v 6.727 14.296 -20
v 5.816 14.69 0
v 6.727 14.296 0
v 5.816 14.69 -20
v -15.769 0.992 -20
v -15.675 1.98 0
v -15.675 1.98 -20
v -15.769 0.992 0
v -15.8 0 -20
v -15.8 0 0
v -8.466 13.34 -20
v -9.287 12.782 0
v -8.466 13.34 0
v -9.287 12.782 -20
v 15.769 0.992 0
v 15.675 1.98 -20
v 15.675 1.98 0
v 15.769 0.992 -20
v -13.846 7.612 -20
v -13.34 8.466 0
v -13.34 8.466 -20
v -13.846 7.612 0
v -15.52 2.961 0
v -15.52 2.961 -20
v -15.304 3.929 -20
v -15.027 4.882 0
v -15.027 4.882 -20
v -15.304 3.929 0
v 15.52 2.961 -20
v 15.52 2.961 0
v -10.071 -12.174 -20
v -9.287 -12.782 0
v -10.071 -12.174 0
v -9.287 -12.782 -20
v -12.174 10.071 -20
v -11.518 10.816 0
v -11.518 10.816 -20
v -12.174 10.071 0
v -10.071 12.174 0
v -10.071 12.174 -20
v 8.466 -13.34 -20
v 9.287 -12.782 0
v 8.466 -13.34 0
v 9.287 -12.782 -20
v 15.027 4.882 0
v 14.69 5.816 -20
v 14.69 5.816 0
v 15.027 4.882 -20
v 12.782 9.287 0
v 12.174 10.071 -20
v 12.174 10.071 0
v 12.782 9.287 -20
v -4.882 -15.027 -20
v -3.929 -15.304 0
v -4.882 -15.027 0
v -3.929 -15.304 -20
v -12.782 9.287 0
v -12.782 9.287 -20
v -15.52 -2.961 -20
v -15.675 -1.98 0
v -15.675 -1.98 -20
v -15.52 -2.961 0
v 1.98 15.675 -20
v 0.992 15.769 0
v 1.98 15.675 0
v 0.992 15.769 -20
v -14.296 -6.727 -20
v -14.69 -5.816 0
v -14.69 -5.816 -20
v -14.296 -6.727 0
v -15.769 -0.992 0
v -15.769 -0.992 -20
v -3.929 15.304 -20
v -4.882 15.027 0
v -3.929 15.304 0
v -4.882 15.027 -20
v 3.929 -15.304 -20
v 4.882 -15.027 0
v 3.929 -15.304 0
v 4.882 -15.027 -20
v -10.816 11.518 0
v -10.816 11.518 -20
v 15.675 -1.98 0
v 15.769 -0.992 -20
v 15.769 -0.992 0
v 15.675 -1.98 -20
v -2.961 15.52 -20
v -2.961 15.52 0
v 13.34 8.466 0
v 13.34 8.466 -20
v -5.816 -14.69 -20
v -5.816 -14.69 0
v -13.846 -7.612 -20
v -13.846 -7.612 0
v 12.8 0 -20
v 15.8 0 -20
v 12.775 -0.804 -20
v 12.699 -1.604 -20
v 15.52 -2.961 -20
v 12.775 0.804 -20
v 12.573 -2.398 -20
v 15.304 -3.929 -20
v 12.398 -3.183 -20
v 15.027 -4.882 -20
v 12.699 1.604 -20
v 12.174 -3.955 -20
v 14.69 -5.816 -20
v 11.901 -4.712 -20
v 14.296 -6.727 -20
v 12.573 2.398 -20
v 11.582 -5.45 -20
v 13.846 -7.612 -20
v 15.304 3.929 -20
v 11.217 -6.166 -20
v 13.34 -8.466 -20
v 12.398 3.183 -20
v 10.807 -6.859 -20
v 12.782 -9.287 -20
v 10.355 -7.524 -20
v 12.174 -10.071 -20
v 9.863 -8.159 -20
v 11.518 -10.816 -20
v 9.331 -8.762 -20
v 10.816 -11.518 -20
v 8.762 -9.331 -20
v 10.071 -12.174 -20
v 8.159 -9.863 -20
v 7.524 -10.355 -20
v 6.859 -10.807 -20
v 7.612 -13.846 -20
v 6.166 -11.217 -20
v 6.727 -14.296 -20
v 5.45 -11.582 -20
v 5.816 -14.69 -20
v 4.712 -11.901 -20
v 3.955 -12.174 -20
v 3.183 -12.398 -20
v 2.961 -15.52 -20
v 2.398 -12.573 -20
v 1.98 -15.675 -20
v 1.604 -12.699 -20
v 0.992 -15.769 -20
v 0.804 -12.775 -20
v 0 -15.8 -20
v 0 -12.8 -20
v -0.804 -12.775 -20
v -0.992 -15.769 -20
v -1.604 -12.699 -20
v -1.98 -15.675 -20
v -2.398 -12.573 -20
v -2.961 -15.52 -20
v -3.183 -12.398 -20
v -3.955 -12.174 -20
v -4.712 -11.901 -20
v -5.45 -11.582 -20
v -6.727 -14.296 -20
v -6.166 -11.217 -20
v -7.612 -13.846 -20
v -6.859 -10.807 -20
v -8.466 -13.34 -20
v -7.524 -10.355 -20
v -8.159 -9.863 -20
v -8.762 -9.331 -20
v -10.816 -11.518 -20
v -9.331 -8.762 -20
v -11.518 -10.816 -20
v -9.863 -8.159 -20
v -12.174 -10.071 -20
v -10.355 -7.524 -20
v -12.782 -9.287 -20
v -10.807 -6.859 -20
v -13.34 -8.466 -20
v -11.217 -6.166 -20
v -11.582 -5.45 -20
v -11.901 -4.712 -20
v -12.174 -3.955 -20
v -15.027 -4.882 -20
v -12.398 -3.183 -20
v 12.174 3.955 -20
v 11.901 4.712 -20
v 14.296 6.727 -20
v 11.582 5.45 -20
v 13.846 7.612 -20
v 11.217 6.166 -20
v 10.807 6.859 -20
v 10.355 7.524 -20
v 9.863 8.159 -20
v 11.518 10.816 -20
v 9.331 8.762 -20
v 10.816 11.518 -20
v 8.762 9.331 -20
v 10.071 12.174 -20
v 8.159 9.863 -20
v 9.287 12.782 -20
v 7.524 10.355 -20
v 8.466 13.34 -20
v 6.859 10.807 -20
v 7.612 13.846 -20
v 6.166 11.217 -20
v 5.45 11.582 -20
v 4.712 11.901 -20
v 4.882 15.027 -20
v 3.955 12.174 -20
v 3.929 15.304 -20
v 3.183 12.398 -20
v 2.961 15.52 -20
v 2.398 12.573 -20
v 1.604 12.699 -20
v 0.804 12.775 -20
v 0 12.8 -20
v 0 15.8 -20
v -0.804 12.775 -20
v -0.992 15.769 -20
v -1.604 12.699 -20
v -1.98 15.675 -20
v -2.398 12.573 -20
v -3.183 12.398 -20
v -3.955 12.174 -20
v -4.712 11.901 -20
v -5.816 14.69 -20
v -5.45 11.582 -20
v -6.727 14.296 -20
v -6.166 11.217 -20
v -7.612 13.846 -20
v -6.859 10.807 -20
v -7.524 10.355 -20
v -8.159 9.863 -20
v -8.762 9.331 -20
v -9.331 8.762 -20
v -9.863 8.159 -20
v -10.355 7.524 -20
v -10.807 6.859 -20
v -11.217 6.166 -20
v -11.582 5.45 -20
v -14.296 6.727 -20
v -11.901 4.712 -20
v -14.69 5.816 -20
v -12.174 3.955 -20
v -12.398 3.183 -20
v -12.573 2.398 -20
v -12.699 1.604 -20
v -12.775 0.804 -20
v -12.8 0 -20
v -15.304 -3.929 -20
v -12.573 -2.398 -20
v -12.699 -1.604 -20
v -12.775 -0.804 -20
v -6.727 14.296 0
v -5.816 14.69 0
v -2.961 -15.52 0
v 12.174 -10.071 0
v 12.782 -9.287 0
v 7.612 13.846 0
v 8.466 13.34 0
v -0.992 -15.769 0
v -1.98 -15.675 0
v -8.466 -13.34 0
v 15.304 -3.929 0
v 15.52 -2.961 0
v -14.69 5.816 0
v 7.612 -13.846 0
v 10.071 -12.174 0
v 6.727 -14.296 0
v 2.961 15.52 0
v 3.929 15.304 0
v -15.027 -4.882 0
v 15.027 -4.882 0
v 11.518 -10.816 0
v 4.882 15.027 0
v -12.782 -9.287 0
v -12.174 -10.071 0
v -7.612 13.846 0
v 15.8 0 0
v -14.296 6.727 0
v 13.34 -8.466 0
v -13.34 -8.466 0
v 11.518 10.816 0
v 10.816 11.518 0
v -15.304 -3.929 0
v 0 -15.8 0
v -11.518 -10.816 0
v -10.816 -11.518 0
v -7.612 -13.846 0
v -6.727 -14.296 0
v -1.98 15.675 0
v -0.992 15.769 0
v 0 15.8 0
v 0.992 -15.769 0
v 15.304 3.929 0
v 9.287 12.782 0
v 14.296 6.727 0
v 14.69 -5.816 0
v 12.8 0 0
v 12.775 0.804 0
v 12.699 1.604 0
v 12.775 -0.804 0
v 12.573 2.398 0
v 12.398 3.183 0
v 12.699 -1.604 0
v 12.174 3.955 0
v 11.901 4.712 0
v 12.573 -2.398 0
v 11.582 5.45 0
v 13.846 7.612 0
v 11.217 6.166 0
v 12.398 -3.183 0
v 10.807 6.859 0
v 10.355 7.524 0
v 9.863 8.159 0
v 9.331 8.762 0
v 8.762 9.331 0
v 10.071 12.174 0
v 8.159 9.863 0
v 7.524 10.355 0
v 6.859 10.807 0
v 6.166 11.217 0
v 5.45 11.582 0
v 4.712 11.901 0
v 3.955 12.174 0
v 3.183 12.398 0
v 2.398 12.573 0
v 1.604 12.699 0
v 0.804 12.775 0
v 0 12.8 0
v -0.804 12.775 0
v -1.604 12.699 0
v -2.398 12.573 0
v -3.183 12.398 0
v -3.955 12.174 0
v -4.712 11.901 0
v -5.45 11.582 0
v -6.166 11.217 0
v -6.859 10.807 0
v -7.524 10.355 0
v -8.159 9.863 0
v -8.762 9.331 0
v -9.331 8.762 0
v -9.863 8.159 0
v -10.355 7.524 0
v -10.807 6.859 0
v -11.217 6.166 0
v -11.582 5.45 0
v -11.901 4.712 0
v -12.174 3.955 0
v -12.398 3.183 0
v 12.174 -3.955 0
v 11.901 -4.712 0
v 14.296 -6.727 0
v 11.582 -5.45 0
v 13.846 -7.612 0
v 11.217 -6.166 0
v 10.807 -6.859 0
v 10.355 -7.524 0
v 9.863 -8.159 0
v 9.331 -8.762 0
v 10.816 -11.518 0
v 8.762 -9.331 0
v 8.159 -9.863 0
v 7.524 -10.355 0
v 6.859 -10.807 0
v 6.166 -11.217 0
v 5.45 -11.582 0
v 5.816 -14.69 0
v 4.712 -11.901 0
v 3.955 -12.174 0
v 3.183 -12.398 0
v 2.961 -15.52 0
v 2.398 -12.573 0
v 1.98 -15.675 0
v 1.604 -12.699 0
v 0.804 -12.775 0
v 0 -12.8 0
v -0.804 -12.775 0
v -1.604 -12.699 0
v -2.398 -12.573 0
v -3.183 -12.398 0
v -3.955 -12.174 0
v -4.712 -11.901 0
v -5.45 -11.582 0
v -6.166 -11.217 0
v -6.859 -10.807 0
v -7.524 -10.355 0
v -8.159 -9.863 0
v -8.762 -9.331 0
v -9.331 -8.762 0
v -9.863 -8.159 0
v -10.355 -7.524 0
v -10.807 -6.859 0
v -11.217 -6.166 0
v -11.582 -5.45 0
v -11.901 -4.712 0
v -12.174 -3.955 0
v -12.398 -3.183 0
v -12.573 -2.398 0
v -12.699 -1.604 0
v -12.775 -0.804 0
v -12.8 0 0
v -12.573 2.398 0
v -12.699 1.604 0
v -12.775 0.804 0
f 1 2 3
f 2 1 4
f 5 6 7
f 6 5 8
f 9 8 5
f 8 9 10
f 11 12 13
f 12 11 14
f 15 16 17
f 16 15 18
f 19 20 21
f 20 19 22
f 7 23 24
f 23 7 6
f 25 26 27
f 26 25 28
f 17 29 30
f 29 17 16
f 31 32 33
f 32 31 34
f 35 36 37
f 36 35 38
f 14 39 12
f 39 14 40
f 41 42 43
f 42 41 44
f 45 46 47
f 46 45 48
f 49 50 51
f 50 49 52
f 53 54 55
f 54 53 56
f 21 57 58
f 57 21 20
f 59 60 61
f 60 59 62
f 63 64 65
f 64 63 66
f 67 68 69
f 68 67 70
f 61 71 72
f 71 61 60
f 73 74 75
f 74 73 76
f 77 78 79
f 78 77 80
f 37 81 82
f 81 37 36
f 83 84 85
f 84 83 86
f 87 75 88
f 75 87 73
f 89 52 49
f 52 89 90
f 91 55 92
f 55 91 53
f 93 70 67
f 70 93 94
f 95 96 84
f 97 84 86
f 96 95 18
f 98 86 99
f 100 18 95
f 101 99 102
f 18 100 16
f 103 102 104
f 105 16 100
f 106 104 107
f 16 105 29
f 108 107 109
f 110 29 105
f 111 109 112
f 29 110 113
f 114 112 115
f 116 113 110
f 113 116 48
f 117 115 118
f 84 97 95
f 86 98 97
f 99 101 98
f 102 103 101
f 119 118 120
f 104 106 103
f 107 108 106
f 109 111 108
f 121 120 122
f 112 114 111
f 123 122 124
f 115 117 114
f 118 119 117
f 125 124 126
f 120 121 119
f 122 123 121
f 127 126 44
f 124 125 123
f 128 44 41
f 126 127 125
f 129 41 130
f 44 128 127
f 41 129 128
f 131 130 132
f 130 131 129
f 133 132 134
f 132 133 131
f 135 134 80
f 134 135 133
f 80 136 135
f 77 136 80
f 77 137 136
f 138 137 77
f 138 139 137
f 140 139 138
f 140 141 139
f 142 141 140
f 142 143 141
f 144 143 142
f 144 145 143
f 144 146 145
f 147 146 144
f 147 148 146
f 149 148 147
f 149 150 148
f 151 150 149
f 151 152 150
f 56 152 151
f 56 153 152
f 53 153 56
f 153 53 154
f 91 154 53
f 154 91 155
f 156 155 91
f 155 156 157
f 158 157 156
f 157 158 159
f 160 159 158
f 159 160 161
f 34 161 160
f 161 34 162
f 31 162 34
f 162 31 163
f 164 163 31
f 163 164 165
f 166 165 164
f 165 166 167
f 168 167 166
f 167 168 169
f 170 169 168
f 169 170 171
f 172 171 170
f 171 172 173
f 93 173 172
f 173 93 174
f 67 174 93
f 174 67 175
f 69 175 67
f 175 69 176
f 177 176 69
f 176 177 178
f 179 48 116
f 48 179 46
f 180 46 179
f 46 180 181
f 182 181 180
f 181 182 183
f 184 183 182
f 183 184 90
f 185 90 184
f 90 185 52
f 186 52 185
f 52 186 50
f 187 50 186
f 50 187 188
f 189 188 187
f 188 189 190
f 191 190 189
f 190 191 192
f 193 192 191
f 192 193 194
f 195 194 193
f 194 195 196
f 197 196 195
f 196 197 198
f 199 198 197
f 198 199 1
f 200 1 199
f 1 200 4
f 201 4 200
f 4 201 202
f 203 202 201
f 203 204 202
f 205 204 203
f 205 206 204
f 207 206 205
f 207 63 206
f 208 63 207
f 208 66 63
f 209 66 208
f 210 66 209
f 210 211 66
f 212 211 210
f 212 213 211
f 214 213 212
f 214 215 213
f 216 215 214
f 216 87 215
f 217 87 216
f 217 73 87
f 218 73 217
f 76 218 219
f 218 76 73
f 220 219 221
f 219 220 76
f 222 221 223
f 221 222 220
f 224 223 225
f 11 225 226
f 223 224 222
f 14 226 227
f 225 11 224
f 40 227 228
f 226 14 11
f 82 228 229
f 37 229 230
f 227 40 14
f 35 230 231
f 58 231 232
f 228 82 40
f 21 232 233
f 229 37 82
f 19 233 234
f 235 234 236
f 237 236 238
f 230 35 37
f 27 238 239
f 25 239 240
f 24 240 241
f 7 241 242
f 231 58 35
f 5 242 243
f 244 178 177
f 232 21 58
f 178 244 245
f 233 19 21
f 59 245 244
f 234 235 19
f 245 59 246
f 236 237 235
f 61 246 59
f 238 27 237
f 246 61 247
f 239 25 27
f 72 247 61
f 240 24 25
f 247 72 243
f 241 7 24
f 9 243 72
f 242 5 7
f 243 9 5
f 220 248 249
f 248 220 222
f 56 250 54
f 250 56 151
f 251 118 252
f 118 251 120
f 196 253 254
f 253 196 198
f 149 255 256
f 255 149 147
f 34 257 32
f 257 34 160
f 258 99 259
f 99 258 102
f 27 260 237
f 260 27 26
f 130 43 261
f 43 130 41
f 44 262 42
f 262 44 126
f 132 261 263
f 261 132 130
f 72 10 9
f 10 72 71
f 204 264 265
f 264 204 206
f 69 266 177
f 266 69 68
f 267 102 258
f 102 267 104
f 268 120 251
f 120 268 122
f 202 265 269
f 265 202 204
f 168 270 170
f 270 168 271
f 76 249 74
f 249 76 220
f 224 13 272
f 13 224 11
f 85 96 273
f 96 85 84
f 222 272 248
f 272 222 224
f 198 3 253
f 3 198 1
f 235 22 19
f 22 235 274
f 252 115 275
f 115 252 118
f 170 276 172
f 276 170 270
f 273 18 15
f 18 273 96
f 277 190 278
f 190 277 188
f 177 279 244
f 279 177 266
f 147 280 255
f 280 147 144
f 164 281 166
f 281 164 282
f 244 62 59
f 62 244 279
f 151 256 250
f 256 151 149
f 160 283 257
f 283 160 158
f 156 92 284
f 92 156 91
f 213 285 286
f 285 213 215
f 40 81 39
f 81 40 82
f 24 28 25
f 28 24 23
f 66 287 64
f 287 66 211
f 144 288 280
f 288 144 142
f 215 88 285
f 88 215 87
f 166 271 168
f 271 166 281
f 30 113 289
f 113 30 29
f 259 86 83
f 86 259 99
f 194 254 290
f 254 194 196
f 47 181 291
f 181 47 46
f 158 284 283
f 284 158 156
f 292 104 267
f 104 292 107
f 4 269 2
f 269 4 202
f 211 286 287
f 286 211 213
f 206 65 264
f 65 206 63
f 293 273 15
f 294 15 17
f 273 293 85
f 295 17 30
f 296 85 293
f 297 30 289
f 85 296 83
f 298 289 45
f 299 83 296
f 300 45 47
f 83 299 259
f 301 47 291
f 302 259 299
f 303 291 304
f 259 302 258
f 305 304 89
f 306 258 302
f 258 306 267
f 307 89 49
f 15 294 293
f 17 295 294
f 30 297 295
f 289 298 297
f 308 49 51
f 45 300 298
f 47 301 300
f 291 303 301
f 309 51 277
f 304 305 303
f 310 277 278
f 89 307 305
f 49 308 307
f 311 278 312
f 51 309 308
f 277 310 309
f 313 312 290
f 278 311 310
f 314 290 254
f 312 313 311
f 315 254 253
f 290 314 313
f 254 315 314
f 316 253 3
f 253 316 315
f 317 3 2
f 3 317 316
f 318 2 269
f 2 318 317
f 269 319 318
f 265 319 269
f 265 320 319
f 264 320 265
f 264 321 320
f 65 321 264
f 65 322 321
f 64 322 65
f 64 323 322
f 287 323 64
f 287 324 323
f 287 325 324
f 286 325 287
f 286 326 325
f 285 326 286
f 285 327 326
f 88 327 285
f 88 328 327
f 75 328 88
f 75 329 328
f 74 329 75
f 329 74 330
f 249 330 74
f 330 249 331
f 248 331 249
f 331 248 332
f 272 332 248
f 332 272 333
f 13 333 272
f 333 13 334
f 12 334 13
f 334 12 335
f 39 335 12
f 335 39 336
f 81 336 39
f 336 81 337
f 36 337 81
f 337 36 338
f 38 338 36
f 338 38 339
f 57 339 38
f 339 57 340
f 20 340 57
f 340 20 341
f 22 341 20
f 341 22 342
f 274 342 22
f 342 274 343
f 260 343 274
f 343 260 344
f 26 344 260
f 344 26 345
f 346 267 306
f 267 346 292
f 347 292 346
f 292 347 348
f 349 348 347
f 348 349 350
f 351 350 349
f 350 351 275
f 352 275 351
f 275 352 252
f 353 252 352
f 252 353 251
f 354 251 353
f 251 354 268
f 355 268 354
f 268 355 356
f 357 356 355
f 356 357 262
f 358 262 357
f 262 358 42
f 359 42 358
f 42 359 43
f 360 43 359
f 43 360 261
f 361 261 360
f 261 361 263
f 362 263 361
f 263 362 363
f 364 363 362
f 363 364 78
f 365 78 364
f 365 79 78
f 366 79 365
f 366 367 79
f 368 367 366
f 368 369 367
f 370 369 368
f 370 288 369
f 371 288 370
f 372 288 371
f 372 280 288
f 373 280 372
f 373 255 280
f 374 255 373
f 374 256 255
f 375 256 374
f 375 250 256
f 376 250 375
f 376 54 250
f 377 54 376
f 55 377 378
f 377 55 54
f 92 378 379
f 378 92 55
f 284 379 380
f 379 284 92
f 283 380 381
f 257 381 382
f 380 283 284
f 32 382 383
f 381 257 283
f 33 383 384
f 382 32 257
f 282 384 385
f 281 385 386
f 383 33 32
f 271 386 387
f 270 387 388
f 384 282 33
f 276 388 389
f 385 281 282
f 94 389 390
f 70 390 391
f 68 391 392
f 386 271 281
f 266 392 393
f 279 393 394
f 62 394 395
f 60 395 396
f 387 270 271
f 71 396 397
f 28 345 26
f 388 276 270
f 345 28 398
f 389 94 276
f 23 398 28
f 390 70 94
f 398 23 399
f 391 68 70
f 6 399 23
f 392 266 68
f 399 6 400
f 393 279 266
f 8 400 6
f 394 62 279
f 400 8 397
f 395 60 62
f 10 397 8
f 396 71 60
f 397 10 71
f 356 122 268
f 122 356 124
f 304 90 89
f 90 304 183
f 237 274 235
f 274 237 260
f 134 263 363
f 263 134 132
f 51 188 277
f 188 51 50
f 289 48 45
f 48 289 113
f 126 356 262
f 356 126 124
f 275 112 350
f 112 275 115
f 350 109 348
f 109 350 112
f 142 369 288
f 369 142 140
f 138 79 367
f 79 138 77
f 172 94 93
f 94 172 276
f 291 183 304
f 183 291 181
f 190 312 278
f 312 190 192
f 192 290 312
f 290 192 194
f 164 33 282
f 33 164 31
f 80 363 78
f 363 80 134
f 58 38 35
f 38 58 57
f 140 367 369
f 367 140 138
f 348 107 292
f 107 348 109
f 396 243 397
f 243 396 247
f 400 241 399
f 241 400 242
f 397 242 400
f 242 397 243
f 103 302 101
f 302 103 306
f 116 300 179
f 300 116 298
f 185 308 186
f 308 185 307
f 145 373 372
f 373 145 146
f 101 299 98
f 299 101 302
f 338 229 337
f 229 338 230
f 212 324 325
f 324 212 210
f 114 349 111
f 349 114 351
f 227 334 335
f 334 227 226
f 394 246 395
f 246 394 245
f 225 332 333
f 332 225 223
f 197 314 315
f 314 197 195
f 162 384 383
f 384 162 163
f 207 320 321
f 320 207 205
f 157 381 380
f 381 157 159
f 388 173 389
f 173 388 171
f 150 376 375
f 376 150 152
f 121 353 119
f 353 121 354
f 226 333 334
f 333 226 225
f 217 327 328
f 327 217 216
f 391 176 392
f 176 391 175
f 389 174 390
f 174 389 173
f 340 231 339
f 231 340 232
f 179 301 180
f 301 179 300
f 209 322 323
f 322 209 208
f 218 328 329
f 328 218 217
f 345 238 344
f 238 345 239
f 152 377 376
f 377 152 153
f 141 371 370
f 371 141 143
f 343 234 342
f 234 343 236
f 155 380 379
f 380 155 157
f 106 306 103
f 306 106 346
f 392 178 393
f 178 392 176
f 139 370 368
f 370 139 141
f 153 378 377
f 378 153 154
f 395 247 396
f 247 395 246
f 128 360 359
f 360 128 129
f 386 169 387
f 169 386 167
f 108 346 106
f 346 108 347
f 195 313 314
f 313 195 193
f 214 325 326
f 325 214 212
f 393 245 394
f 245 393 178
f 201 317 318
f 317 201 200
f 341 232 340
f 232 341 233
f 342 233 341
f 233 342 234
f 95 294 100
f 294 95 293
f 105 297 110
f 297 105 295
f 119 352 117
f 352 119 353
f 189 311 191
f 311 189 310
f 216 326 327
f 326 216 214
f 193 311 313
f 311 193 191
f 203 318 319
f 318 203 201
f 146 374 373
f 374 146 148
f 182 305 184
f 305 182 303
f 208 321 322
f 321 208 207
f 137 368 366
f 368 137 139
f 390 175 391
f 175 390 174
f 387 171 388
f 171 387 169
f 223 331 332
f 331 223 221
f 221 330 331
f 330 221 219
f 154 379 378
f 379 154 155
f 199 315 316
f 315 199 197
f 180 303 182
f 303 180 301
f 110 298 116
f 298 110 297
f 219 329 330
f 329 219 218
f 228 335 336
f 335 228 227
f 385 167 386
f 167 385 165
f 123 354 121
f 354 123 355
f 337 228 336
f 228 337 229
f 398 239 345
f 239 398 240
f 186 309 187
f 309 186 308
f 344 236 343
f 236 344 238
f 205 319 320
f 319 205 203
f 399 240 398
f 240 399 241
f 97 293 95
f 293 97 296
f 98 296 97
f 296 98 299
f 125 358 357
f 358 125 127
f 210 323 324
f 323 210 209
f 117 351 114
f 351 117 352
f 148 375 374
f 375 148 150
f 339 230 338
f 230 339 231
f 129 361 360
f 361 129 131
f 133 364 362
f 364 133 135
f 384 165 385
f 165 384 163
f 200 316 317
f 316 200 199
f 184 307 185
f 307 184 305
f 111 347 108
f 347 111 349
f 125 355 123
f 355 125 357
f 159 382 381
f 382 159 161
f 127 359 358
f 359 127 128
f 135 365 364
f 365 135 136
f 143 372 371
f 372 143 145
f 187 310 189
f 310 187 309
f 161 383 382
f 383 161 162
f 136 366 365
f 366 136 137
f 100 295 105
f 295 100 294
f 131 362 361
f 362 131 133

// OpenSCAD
// file: ../lib/sensor.scad
//rotationSensor();
//rotationSensorSpacing();

module rotationSensor(){
	//Digi-Key Part Number: 490-2400-ND
	//Manufacturer Part Number: SV01A103AEA01B00
	
	roatationSensorBody();
	
	translate([-6.5, -2.5, -0.6])
		cube([1.5, 0.8, 0.2], center = true);
		
	translate([-6.5, 0, -0.6])
		cube([1.5, 0.8, 0.2], center = true);		
		
	translate([-6.5, 2.5, -0.6])
		cube([1.5, 0.8, 0.2], center = true);		
		
	translate([6.5, 0, -0.6])
		cube([1.5, 0.8, 0.2], center = true);				
}

module roatationSensorBody(inflate = false) {
	x1 = inflate ? 1 : 0;
	x2 = inflate ? 0.25 : 0;
	x3 = inflate ? 0.5 : 0;

	difference()
	{
		cube ([12 + x1, 11 + x1, 2 + x3], center = true);
		
		//translate([0.5, 0, 0]) 
		difference() 
		{
			cylinder(h = 5, d1 = 4, d2 = 4, center = true, $fn = 15);
			translate([3, 0, 0]) cube([4, 4, 4], center = true);
		}
		
		translate([8 + x2, 7.5 + x2, 0])
		rotate([0, 0, 45]) 
			cube([10, 10, 5], center = true);
		
		translate([8 + x2, -7.5 - x2, 0])
		rotate([0, 0, -45]) 
			cube([10, 10, 5], center = true);
		
		//translate([-8.7 - x2, 8.7 + x2, 0])
		//rotate([0, 0, 45]) 
		//	cube([10, 10, 5], center = true);
		
		//translate([-8.7 - x2, -8.7 - x2, 0])
		//rotate([0, 0, -45]) 
		//	cube([10, 10, 5], center = true);				
	}
}

module rotationSensorSpacing() {
	translate([0, 0, 1])
		roatationSensorBody(inflate = true);
	
	cylinder(h = 10, d = 6, $fn = 15);
	
	translate([-7.5, 0, 0])
		cube ([2, 8.5, 15], center = true);

	translate([-5.5, 5, 2.5])
		cube ([2, 2, 1], center = true);
		
	translate([-5.5, -5, 2.5])
		cube ([2, 2, 1], center = true);
}
// file: ../lib/pulley.scad
additionalToothWidth = 0.2; //mm
additionalToothHeight = 0; //mm

//pulley (teeth = 100, height = 10);

module pulley(teeth, height, type="GT2", center = false, upperBorder = true, lowerBorder = true) {
	toothDepth = type=="MXL" ? 0.508 : 0.764;
	toothWidth =  type=="MXL" ? 1.321 : 1.494;
	toothPitch = type=="MXL" ? 2.032 : 2.00;
	pitchLineOffset = type=="MXL" ? 0.254 : 0.254;
	
	pulleyD = 2*((teeth*toothPitch)/(3.14159265*2)-pitchLineOffset);
	toothDistanceFromCentre = sqrt( pow(pulleyD/2,2) - pow((toothWidth+additionalToothWidth)/2,2));
	toothWidthScale = (toothWidth + additionalToothWidth ) / toothWidth;
	toothDepthScale = ((toothDepth + additionalToothHeight ) / toothDepth) ;
	
	difference()
	{
		union()
		{
			cylinder(d=pulleyD,h=height, $fn=teeth*4, center = center);
			
			if (upperBorder)
				translate([0, 0, height/2])
					cylinder(d=pulleyD + 1,h=1.5, $fn=teeth*4);
				
			if (lowerBorder)
				translate([0, 0, -height/2 - 1.5])
					cylinder(d=pulleyD + 1,h=1.5, $fn=teeth*4);				
		}
			
		for(i=[1:teeth])
		{			
			rotate([0,0,i*(360/teeth)])
			translate([0,-toothDistanceFromCentre,-height/2]) 
			scale ([ toothWidthScale , toothDepthScale , 1 ]) 
				if (type=="MXL")
				{
					toothMXL(height);
				}
				else
				{
					toothGT2(height);
				}
		}
	}
}
			
module toothMXL(height) {
	linear_extrude(height=height) 
		polygon([[-0.660421,-0.5],[-0.660421,0],[-0.621898,0.006033],[-0.587714,0.023037],[-0.560056,0.049424],[-0.541182,0.083609],[-0.417357,0.424392],[-0.398413,0.458752],[-0.370649,0.48514],[-0.336324,0.502074],[-0.297744,0.508035],[0.297744,0.508035],[0.336268,0.502074],[0.370452,0.48514],[0.39811,0.458752],[0.416983,0.424392],[0.540808,0.083609],[0.559752,0.049424],[0.587516,0.023037],[0.621841,0.006033],[0.660421,0],[0.660421,-0.5]]);
}

module toothGT2(height) {
	linear_extrude(height=height) 
		polygon([[0.747183,-0.5],[0.747183,0],[0.647876,0.037218],[0.598311,0.130528],[0.578556,0.238423],[0.547158,0.343077],[0.504649,0.443762],[0.451556,0.53975],[0.358229,0.636924],[0.2484,0.707276],[0.127259,0.750044],[0,0.76447],[-0.127259,0.750044],[-0.2484,0.707276],[-0.358229,0.636924],[-0.451556,0.53975],[-0.504797,0.443762],[-0.547291,0.343077],[-0.578605,0.238423],[-0.598311,0.130528],[-0.648009,0.037218],[-0.747183,0],[-0.747183,-0.5]]);
}
// file: ../lib/ballBearing.scad
//ballBearingHolder(28, 8, 4);

module ballBearing6707(){
	//35x44x5
	ballBearing(inner = 35, outer = 44, height = 5);
}

module ballBearing6706(){
	//30x37x4
	ballBearing(inner = 30, outer = 37, height = 4);
}

module ballBearing6705() {
	// 25x32x4
	ballBearing(inner = 25, outer = 32, height = 4);
}


module ballBearing8607() {
	// 35x47x7
	ballBearing(inner = 35, outer = 47, height = 7);
}

module ballBearing6806(){
	// 30x42x7
	ballBearing(inner = 30, outer = 42, height = 7);
}

module ballBearing6805() {
	// 25x37x7
	ballBearing(inner = 25, outer = 37, height = 7);
}

module ballBearing6804() {
	//20x32x7
	ballBearing(inner = 20, outer = 32, height = 7);
}

module ballBearing(inner, outer, height) {
	difference()
	{
		cylinder(d = outer, h = height, center = true, $fn = 50);
		cylinder(d = inner, h = height + 2, center = true, $fn = 50);
	}
}

module ballBearingHolder(outer, h, thickness) {
    difference(){
        cylinder(h = h + 2, d1 = outer + thickness * 2, d2 = outer + thickness * 2);
        
        translate([0, 0, 2]) 
            cylinder(h = h+1, d1 = outer, d2 = outer);
        
        translate([0, 0, -1])
            cylinder(h = h + 4, d1 = outer - 4, d2 = outer - 4); 
    }
}
// file: ../brushless/_sizes.scad
h1 = 250;
h2 = 170;

belt = 7; // 6 mm wide belt
pulleyH = belt + 3;

th = 3;
thEdge = 1.5; // ball bearing holder

// ball bearing

bbi = 25 - 0.2;
bbo = 37 + 0.7;
bbh = 7;

bbiPlastic = 25 + 0.4;
bboPlastic = 37 - 0.6;

//

bb6000i = 10 - 0.2;
bb6000o = 26 + 0.7;
bb6000h = 8;

//

bb6800i = 10 - 0.2;
bb6800o = 19 + 0.7;
bb6800h = 5;

//

bb6805i = 25 - 0.2;
bb6805o = 37 + 0.7;
bb6805h = 7;

//

rod25o = 25;
rod25i = rod25o - 1 * 2;

rod = 10 + 0.2;

motorAdjustment = 5; // one side

// motors ---------------------------------------------------------------------

// 50XX

motor5D = 58;
motor5H = 27;

motor5SpaceD = motor5D + 5;
motor5SpaceH = motor5H;

//40XX

motor4D = 50;
motor4H = 30;

motor4SpaceD = motor4D + 5;
motor4SpaceH = motor4H;

// heap -----------------------------------------------------------------------

heapWidth = 70;

// part 1 ---------------------------------------------------------------------

part1MotorX = 20;
part1UpperAttachment = 25;
part1LowerAttachment = 25;
part1HeapMotorOffset = [part1MotorX, 0, -50];
part1KneeMotorOffset = [part1MotorX, 0, -h1 + 50];
part1KneeOffset = [0, 0, -h1];

// part 2 ---------------------------------------------------------------------

part2MotorOffset = [10, 0, -h2 + 50];
part2LowerAttachment = 8;
part2AnkleOffset = [0, 0, -h2];
// file: ../brushless/_shared.scad
include <_sizes.scad>
use <../lib/shapes.scad>
use <../lib/ballBearing.scad>
use <../lib/pulley.scad>
use <../lib/sensor.scad>

difference()
{
	bearingOuter();
	translate([-50, 0, 0])
	cube ([100, 100, 100]);
}

module bearingOuter(withPulley = true) {
	translate([-thEdge/2, 0, 0])
	rotate([0, -90, 0])
		if (withPulley)
		{
			difference()
			{
				pulley(teeth=70, height = belt, center = true);
				cylinder(d = bbo, h = belt + 5, $fn = 70, center = true);
			}
		}
		else
		{
			ring(d = bbo, t = th, h = bbh + thEdge, $fn = 70);
		}

	// this stops the bearing
	
	translate([(-bbh - thEdge - 1) / 2, 0, 0])
	rotate([0, -90, 0])
		ring(d = bbo - thEdge * 2, t = thEdge * 2, h = thEdge + 1, $fn = 70);
		
	// sensor holder
	
	translate([(-bbh - th) / 2 - 1, 0, 0])
	rotate([0, -90, 0])
	difference()
	{
		cylinder(h = th, d = bbo);
		
		rotationSensorSpacing();
		
		translate([0, 11, 0])
			cylinder (d =6, h = 10, center = true);

		translate([0, -11, 0])
			cylinder (d =6, h = 10, center = true);
	}
}

module bearingInner(showBearing = true, color) {
	outside = 10;

	if (showBearing)
	{
		color("white")
		rotate([0, -90, 0])
			ballBearing(inner = bbi, outer = bbo, height = bbh);
	}
		
	// inner

	color(color)
	{
		translate([(outside - thEdge) / 2, 0, 0])
		rotate([0, 90, 0])
			ring(d = bbi - th * 2, t = th, h = bbh + outside + thEdge, $fn = 70);
			
		translate([(-bbh - thEdge) / 2, 0, 0])
		rotate([0, 90, 0])
		{
			ring(d = bbi, t = thEdge, h = thEdge, $fn = 70);
			
			translate([0, 0, (th - thEdge) / 2])
				cube([6, bbi - 2, th], center = true);
				
			translate([0, 0, -2])
			dCylinder(h = 5, d = 4, x = 1, $fn = 20);	
		}
	}
}

module motor4(){
	z = 3;
	
	cylinder(d1 = 30, d2 = motor4D, h = z);
	translate([0, 0, z]) cylinder(d1 = motor4D, d2 = motor4D, h = motor4H - z * 2);
	translate([0, 0, motor4H - z]) cylinder(d1 = motor4D, d2 = 30, h = z);
	
	cylinder(d = 25, h = motor4H + pulleyH);	
}

module motor5() {
	z = 3;
	
	cylinder(d1 = 30, d2 = motor5D, h = z);
	translate([0, 0, z]) cylinder(d1 = motor5D, d2 = motor5D, h = motor5H - z * 2);
	translate([0, 0, motor5H - z]) cylinder(d1 = motor5D, d2 = 30, h = z);
	
	cylinder(d = 25, h = motor5H + pulleyH);	
}	

module motor5BoltSpace(){
	d = 25 / sqrt(2) / 2;
	
	for (x = [-d, d])
	for (y = [-d, d])
		translate([x, y, 0])
		hull()
		{
			translate([0, motorAdjustment, 0])
				cylinder(d = 4, h = 10);
				
			translate([0, -motorAdjustment, 0])
				cylinder(d = 4, h = 10);
		}
		
	hull()
	{
		translate([0, motorAdjustment, 0])
			cylinder(d = 10, h = 10);
			
		translate([0, -motorAdjustment, 0])
			cylinder(d = 10, h = 10);			
	}
}

module motor4BlockA(inner = false) {
	wall = inner ? 0 : th ;
	
	hull() 
	{
		translate([motorAdjustment, 0, wall/2])
			halfShayba(d = motor4SpaceD + wall * 2, h = motor4SpaceH + wall, rd = 15);

		translate([-motorAdjustment, 0, wall/2])
			halfShayba(d = motor4SpaceD + wall * 2, h = motor4SpaceH + wall, rd = 15);
	}
}

module motor5BlockA(inner = false) {
	wall = inner ? 0 : th;
	
	hull() 
	{
		translate([motorAdjustment, 0, wall/2])
			halfShayba(d = motor5SpaceD + wall * 2, h = motor5SpaceH + wall, rd = 15);

		translate([-motorAdjustment, 0, wall/2])
			halfShayba(d = motor5SpaceD + wall * 2, h = motor5SpaceH + wall, rd = 15);
	}
}

module motor5BlockB(inner = false) {
	wall = inner ? 0 : th;
	h = 13;
	
	translate([0, 0, -motor5SpaceH / 2 - h/2])
	rotate([180, 0, 0])
	hull() 
	{
		translate([motorAdjustment, 0, wall/2])
			halfShayba(d = motor5SpaceD + wall * 2, h = h + wall, rd = 15);

		translate([-motorAdjustment, 0, wall/2])
			halfShayba(d = motor5SpaceD + wall * 2, h = h + wall, rd = 15);
	}
}

module bb6000(){
	bbi = 10;
	bbo = 26;
	bbh = 8;

	ring(d = bbi, h = bbh, t = (bbo-bbi)/2);
}

module bb6800(){
	bbi = 10;
	bbo = 19;
	bbh = 5;

	ring(d = bbi, h = bbh, t = (bbo-bbi)/2);
}

module bb6805(){
	bbi = 25;
	bbo = 37;
	bbh = 7;

	ring(d = bbi, h = bbh, t = (bbo-bbi)/2);
}
// file: ../lib/shapes.scad
module cylinderSector(d, h, start_angle, end_angle) {
    R = d * sqrt(2) / 2;// + 1;
    a0 = (4 * start_angle + 0 * end_angle) / 4;
    a1 = (3 * start_angle + 1 * end_angle) / 4;
    a2 = (2 * start_angle + 2 * end_angle) / 4;
    a3 = (1 * start_angle + 3 * end_angle) / 4;
    a4 = (0 * start_angle + 4 * end_angle) / 4;
    if(end_angle > start_angle)
		linear_extrude(height = h)
        intersection() {
			circle(d = d);
			polygon([
				[0,0],
				[R * cos(a0), R * sin(a0)],
				[R * cos(a1), R * sin(a1)],
				[R * cos(a2), R * sin(a2)],
				[R * cos(a3), R * sin(a3)],
				[R * cos(a4), R * sin(a4)],
				[0,0]
		   ]);
		}
}

module ringSector(d, h, t, start_angle, end_angle)
{
	difference()
	{
		cylinderSector(d = d + t*2, h = h, start_angle=start_angle, end_angle=end_angle) ;
		
		translate([0, 0, -0.5])
			cylinder(d = d, h = h + 1);
	}
}

//Draw a prism based on a 
//right angled triangle
//l - length of prism
//w - width of triangle
//h - height of triangle

module prism(l, w, h) {
       polyhedron(points=[
               [0,0,h],           // 0    front top corner
               [0,0,0],[w,0,0],   // 1, 2 front left & right bottom corners
               [0,l,h],           // 3    back top corner
               [0,l,0],[w,l,0]    // 4, 5 back left & right bottom corners
       ], faces=[ // points for all faces must be ordered clockwise when looking in
               [0,2,1],    // top face
               [3,4,5],    // base face
               [0,1,4,3],  // h face
               [1,2,5,4],  // w face
               [0,3,5,2],  // hypotenuse face
       ]);
}

//The top point will be centred
module pyramid(w, l, h) {
	mw = w/2;
	ml = l/2;
	polyhedron(points = [
		[0,  0,  0],
		[w,  0,  0],
		[0,  l,  0],
		[w,  l,  0],
		[mw, ml, h]
	], faces = [
		[4, 1, 0],
		[4, 3, 1],
		[4, 2, 3],
		[4, 0, 2],
		//base
		[0, 1, 2],
		[2, 1, 3]
	]);
}

//pyramid(4,4,4);

//A cuboid with a tapered top
//w - width
//l - length
//h - height
//taper - how much to taper the each edge at the top by

module tapered_cuboid(w, l, h, taper) {
	ho = taper;
	hw = w - taper;
	hl = l - taper;
	polyhedron( points=[
		[ 0,  0, 0],
		[ho, ho, h],
		[hw, ho, h],
		[ w,  0, 0],
		[ 0,  l, 0],
		[ho, hl, h],
		[hw, hl, h],
		[ w,  l, 0] 
	], faces = [
		[0, 1, 2],
		[2, 3, 0],
		[3, 2, 6],
		[6, 7, 3],
		[7, 6, 5],
		[5, 4, 7],
		[4, 5, 1],
		[1, 0, 4],
		[1, 5, 2],
		[2, 5, 6],
		[4, 0, 3],
		[7, 4, 3],
	] );
}

module ring(d, h, t, center = true)
{
    difference()
    {
        cylinder(h = h, d = d + t * 2, center = center);
		translate([0, 0, center ? 0 : -1])
			cylinder(h = h + 2, d = d, center = center);
    }
}

module ringDiamond(d, h)
{
	rotate_extrude(convexity = 10)
	translate([d/2, 0, 0])
	rotate([0, 0, 45])
		square(size = [h, h], center = true);
}

module torus(d, w)
{
    rotate_extrude(convexity = 1)
    translate([d / 2, 0, 0])
        circle(d = w);
}

module rod(a, b, d) // a and b are coordinates of ends, d is diameter
{ 
    translate(a) sphere(d = d); 
    translate(b) sphere(d = d); 

    dir = b-a; 
    h   = norm(dir); 
    if(dir[0] == 0 && dir[1] == 0) { 
        // no transformation necessary 
        cylinder(d = d, h=h); 
    } 
    else { 
        w  = dir / h; 
        u0 = cross(w, [0,0,1]); 
        u  = u0 / norm(u0); 
        v0 = cross(w, u); 
        v  = v0 / norm(v0); 
        multmatrix(m=[[u[0], v[0], w[0], a[0]], 
                      [u[1], v[1], w[1], a[1]], 
                      [u[2], v[2], w[2], a[2]], 
                      [0,    0,    0,    1]]) 
        cylinder(d = d, h=h); 
    } 
} 

module shayba(h, d, rd){
	hull()
	{
		translate([0, 0, h/2 - rd/2])
			torus(d = d - rd, w = rd);
			
		translate([0, 0, -h/2 + rd/2])
			torus(d = d - rd, w = rd);			
	}
}

module halfShayba(h, d, rd){
	translate([0, 0, -h/2])
	intersection()
	{
		shayba(h = h * 2, d = d, rd = rd);
		cylinder(h = h + 1, d1 = d + 1, d2 = d + 1);
	}
}

module dCylinder(h, d, x, center = true){
	intersection() 
	{
		cylinder(h = h, d = d, center = center);
		translate([x, 0, 0]) cube([d, d, h*2 + 1], center = true);
	}
}

module sphereSector(d, w, a) {
	intersection()
	{
		difference()
		{
			sphere(d = d);
			sphere(d = d - w * 2);
		}
		cylinder(h = d + 1, d1 = 0, d2 = d * tan(a));
	}
}

// module cylinderSector(d, h, angle) {
	// rotate_extrude(angle=angle, convexity=10)
		// square(size = [d/2, h]);
// }

module coneCup(d1, d2, h, th) {
	difference()
	{
		cylinder(d1 = d1, d2 = d2, h = h);
		
		translate([0, 0, -th])
			cylinder(d1 = d1 - th * 2, d2 = d2 - th * 2, h = h);
	}
}
// file: axis.scad
use <../lib/shapes.scad>
use <../brushless/_shared.scad>
include <../brushless/_sizes.scad>

th = 3;

//

heapWidth = 90;

//

bb6800i = 10;
bb6800o = 19;
bb6800h = 5;

// axis 1

axis1xOffset = rod/2 + th;
axis1Length = 50;

d1 = 85;
ring1Offset = 8;
axis1Angle1 = 80;
axis1Angle2 = 210;
axis1Bearing1 = ring1Offset + bb6805h/2 + th * 2 + 2;
axis1Bearing2 = axis1Length - bb6805h/2;

// axis 2

axis2 = 45;
d2 = 72;
ring2Offset = -axis2/2 + bb6800h + th + 2;
axis2Offset = 0;
axis2Angle1 = 90;
axis2Angle2 = 300;

// angles

heapSideAngleMin = -10;
heapSideAngleMax = 90;
heapFrontAngleMin = -15;
heapFrontAngleMax = 150;

//

axisOverlap = 4;

motorOffset = 33 + ring2Offset - 5;

heapMotorRotate = [axis1Angle2 - 10, 0, 0];
heapMotorTranslate = [60, 0, -(d1 + 25)/2 + 4];

// derivatives

heapBackBearingOffset = axis1xOffset + axis1Bearing2 + bb6805h;

//



//popa();
//assembly(-10, -15);
//translate([0, -heapWidth, 0]) mirror([0, 1, 0]) assembly(90, -15);

module assembly(angle1 = 0, angle2 = 0)
	{
	// body

	color("turquoise")
	{
		rotate(heapMotorRotate)
		translate(heapMotorTranslate)
		rotate([0, -90, 0])
			motor4();

		#body();
	}

	rotate([angle1, 0, 0])
	{
		// axis1 with small ring
		
		translate([axis1xOffset, 0, 0])
		{
			color("pink") 
			{
				axis1Gear();
				
				translate([axis1Bearing1 + bb6805h/2, 0, 0])
					axis1Ring();
			}
			color("white") axis1Metal();
		}
		
		translate([0, 0, axis2Offset])
		{
			// axis2 with big ring

			color("pink") axis2Gear();

			color("white")
			{
				rotate([90, 0, 0])
					cylinder(d = 10, h = axis2, center = true);
				
				translate([0, axis2/2 - 2.5, 0]) rotate([90, 0, 0]) bb6800();
				translate([0, -axis2/2 + 2.5, 0]) rotate([90, 0, 0]) bb6800();
			}

			//

			rotate([0, angle2, 0])
			{
				%render()
				part1();
				
				translate([0, motorOffset, -(d2 + 25)/2 + 4])
				rotate([90, 0, 0])
					motor5();			
			}
		}
	}
}

module popa(){
	difference()
	{
		popaBase(true);
		popaBase(false);
		
		popaMinusHalf();
		translate([0, -heapWidth, 0]) mirror([0, 1, 0]) popaMinusHalf();
	}
}

module popaMinusHalf() {
	render()
	{
		rotate([heapSideAngleMin, 0, 0])
		{
			rotate([0, heapFrontAngleMin, 0])
				partBase(true);

			rotate([0, 80, 0])
				partBase(true);				
				
			rotate([0, heapFrontAngleMax, 0])
				partBase(true);				
		}
		
		rotate([30, 0, 0])
		rotate([0, heapFrontAngleMin, 0])
			partBase(true);
			
		rotate([60, 0, 0])
		rotate([0, heapFrontAngleMin, 0])
			partBase(true);
			
		rotate([heapSideAngleMax, 0, 0])
		rotate([0, heapFrontAngleMin, 0])
			partBase(true);
			
		// space for gear
		
		translate([axis1xOffset + ring1Offset - 3, 0, 0])
			rotate([0, 90, 0])
			cylinder(d = d1 + 10, h = 16);
	}
}

module popaBase(outer = true){
	wall = outer ? 0 : th;

	hull()
	{
		translate([0, -heapWidth, 0]) mirror([0, 1, 0]) popaBaseHalf(outer);
		popaBaseHalf(outer);

		// front
		
		translate([0, -heapWidth/2, 0])
		translate([-10, 0, 0])
			sphere(30 - wall);
	}
}

module popaBaseHalf(outer){
	wall = outer ? 0 : th;
	
	// back motors

	translate([-30, 0, 0])
	rotate(heapMotorRotate)
	translate(heapMotorTranslate)
		sphere(40 - wall);

	translate([heapBackBearingOffset - 30, 5, -5])
		sphere(35 - wall);
}

module part1() {
	difference()
	{
		partBase(outer = true);
		partBase(outer = false);
		
		do = motor5D + th*2;
		h = axis2 - bb6800h*2;
		
		hull()
		{
			rotate([90, 0, 0])
				shayba(d = do, h = h, rd = 10, center = true);

			translate([0, 0, -100])
			rotate([90, 0, 0])
				shayba(d = do, h = h, rd = 10, center = true);
		}		
		
	translate([-100, -100, -300])
		cube([200, 200, 200]);
		
		
		//translate([-100, -100, -100])
		//	cube([100, 100, 100]);
	}
	
	translate([0, -axis2/2 + bb6800h, 0])
	rotate([90, 0, 0])
		ring(d = bb6800o, h = bb6800h, t = th, center = false);
		
	translate([0, axis2/2, 0])
	rotate([90, 0, 0])
		ring(d = bb6800o, h = bb6800h, t = th, center = false);
		
}

module partBase(outer = true) { 
	do = motor5D + (outer ? th*4 : th*2);
	di = bb6800o + (outer ? th*2 : 0);
	h = axis2 + (outer ? th*2 : 0);
	
	difference()
	{
		difference()
		{
			hull()
			{
				rotate([90, 0, 0])
					shayba(d = do, h = h, rd = 15);

				translate([0, 0, -100])
				rotate([90, 0, 0])
					shayba(d = do, h = h, rd = 15);
			}
			
			difference()
			{
				a1 = -65;
				a2 = 240;
				
				translate([0, h/2 + 0.5, 0])
				rotate([90, 0, 0])
					ringSector(d = di, h = h + 1, t = 100, start_angle = a1, end_angle = a2);
					
				rotate([0, -a1, 0])
				translate([0, -h/2, -0.05])
					cube([100, h + 1, di/2 + 0.1]);

				rotate([0, -a2, 0])
				translate([0, -h/2, -di/2])
					cube([100, h + 1, di/2 + 0.01]);
			}
		}
	}
}

module body(){
	translate([axis1xOffset, 0, 0])
	{
		translate([axis1Bearing1, 0, 0])
		rotate([0, 90, 0])
			ring(d = bb6805o, h = bb6805h + th*2, t = th);

		translate([axis1Bearing2, 0, 0])
		rotate([0, 90, 0])
			ring(d = bb6805o, h = bb6805h + th*2, t = th);
	}
}

module axis1Gear(){
	difference()
	{
		union()
		{
			translate([ring1Offset, 0, 0])
			{
				rotate([0, 90, 0])
				{
					ringSector(d = d1 - 10, h = 10, t = 5, start_angle = axis1Angle1, end_angle = axis1Angle2);
					cylinderSector(d = d1 - 10, h = th, start_angle = axis1Angle1, end_angle = axis1Angle2);
				}
			}

			translate([-axisOverlap, 0, 0])
			rotate([0, 90, 0])
				ring(d = rod25o + 0.6, h = axis1Bearing1 + axisOverlap - bb6805h/2, t = th, center = false);
		}

		translate([-axis1xOffset, 0, 0])
		rotate([90, 0, 0])		
			cylinder(d = rod + 0.6 + th*2, h = axis2, center = true);
			
		rotate([0, 90, 0])
			cylinder(d = rod25o + 0.6, h = axis1Bearing1 + axisOverlap - bb6805h/2, center = false);
	}
}

module axis1Ring() {
	rotate([0, 90, 0])
		ring(d = rod25o + 0.6, h = axis1Bearing2 - axis1Bearing1 - bb6805h, t = th, center = false);
}

module axis1Metal(){
	rotate([0, 90, 0])
		ring(d = rod25i, h = axis1Length, t = (rod25o - rod25i)/2, center = false);

	translate([axis1Bearing1, 0, 0])
	rotate([0, 90, 0])
		bb6805();

	translate([axis1Bearing2, 0, 0])
	rotate([0, 90, 0])
		bb6805();
}

module axis2Gear() {
	difference()
	{
		union()
		{
			difference()
			{
				union()
				{
					translate([0, ring2Offset + 10 - th, 0])
					rotate([90, 0, 0])
						//ringSector(d = d2 - 10, h = 10, t = 5, start_angle = axis2Angle1, end_angle = axis2Angle2);
						ring(d = d2 - 10, h = 10, t = 5, center = false);

					translate([0, ring2Offset, 0])
					rotate([90, 0, 0])
						//cylinderSector(d = d2 - 10, h = th, start_angle = axis2Angle1, end_angle = axis2Angle2);
						cylinder(d = d2 - 10, h = th);
				}

				rotate([0, 20, 0])
				translate([0, -axis2/2, 0])
					cube([100, 20, 100]);

				rotate([0, 70, 0])
				translate([0, -axis2/2, 0])
					cube([100, 20, 100]);
			}

			rotate([90, 0, 0])		
				ring(d = rod + 0.6, h = axis2, t = th, center = true);

			translate([-axisOverlap, 0, 0])
			{
				translate([axis1xOffset, 0, 0])
				rotate([0, 90, 0])
					ring(d = rod25i - 0.6 - th*2, h = 10 + axis1xOffset, t = th, center = false);

				rotate([0, 90, 0])
					cylinder(d1 = 10, d2 = rod25i - 0.6, h = axis1xOffset);
			}
		}
		
		rotate([90, 0, 0])
			cylinder(d = rod + 0.6, h = axis2, center = true);
	}
}
// main file
include <axis.scad>

$fn = 100;

rotate([0, 90, 0])
	axis1Ring();
